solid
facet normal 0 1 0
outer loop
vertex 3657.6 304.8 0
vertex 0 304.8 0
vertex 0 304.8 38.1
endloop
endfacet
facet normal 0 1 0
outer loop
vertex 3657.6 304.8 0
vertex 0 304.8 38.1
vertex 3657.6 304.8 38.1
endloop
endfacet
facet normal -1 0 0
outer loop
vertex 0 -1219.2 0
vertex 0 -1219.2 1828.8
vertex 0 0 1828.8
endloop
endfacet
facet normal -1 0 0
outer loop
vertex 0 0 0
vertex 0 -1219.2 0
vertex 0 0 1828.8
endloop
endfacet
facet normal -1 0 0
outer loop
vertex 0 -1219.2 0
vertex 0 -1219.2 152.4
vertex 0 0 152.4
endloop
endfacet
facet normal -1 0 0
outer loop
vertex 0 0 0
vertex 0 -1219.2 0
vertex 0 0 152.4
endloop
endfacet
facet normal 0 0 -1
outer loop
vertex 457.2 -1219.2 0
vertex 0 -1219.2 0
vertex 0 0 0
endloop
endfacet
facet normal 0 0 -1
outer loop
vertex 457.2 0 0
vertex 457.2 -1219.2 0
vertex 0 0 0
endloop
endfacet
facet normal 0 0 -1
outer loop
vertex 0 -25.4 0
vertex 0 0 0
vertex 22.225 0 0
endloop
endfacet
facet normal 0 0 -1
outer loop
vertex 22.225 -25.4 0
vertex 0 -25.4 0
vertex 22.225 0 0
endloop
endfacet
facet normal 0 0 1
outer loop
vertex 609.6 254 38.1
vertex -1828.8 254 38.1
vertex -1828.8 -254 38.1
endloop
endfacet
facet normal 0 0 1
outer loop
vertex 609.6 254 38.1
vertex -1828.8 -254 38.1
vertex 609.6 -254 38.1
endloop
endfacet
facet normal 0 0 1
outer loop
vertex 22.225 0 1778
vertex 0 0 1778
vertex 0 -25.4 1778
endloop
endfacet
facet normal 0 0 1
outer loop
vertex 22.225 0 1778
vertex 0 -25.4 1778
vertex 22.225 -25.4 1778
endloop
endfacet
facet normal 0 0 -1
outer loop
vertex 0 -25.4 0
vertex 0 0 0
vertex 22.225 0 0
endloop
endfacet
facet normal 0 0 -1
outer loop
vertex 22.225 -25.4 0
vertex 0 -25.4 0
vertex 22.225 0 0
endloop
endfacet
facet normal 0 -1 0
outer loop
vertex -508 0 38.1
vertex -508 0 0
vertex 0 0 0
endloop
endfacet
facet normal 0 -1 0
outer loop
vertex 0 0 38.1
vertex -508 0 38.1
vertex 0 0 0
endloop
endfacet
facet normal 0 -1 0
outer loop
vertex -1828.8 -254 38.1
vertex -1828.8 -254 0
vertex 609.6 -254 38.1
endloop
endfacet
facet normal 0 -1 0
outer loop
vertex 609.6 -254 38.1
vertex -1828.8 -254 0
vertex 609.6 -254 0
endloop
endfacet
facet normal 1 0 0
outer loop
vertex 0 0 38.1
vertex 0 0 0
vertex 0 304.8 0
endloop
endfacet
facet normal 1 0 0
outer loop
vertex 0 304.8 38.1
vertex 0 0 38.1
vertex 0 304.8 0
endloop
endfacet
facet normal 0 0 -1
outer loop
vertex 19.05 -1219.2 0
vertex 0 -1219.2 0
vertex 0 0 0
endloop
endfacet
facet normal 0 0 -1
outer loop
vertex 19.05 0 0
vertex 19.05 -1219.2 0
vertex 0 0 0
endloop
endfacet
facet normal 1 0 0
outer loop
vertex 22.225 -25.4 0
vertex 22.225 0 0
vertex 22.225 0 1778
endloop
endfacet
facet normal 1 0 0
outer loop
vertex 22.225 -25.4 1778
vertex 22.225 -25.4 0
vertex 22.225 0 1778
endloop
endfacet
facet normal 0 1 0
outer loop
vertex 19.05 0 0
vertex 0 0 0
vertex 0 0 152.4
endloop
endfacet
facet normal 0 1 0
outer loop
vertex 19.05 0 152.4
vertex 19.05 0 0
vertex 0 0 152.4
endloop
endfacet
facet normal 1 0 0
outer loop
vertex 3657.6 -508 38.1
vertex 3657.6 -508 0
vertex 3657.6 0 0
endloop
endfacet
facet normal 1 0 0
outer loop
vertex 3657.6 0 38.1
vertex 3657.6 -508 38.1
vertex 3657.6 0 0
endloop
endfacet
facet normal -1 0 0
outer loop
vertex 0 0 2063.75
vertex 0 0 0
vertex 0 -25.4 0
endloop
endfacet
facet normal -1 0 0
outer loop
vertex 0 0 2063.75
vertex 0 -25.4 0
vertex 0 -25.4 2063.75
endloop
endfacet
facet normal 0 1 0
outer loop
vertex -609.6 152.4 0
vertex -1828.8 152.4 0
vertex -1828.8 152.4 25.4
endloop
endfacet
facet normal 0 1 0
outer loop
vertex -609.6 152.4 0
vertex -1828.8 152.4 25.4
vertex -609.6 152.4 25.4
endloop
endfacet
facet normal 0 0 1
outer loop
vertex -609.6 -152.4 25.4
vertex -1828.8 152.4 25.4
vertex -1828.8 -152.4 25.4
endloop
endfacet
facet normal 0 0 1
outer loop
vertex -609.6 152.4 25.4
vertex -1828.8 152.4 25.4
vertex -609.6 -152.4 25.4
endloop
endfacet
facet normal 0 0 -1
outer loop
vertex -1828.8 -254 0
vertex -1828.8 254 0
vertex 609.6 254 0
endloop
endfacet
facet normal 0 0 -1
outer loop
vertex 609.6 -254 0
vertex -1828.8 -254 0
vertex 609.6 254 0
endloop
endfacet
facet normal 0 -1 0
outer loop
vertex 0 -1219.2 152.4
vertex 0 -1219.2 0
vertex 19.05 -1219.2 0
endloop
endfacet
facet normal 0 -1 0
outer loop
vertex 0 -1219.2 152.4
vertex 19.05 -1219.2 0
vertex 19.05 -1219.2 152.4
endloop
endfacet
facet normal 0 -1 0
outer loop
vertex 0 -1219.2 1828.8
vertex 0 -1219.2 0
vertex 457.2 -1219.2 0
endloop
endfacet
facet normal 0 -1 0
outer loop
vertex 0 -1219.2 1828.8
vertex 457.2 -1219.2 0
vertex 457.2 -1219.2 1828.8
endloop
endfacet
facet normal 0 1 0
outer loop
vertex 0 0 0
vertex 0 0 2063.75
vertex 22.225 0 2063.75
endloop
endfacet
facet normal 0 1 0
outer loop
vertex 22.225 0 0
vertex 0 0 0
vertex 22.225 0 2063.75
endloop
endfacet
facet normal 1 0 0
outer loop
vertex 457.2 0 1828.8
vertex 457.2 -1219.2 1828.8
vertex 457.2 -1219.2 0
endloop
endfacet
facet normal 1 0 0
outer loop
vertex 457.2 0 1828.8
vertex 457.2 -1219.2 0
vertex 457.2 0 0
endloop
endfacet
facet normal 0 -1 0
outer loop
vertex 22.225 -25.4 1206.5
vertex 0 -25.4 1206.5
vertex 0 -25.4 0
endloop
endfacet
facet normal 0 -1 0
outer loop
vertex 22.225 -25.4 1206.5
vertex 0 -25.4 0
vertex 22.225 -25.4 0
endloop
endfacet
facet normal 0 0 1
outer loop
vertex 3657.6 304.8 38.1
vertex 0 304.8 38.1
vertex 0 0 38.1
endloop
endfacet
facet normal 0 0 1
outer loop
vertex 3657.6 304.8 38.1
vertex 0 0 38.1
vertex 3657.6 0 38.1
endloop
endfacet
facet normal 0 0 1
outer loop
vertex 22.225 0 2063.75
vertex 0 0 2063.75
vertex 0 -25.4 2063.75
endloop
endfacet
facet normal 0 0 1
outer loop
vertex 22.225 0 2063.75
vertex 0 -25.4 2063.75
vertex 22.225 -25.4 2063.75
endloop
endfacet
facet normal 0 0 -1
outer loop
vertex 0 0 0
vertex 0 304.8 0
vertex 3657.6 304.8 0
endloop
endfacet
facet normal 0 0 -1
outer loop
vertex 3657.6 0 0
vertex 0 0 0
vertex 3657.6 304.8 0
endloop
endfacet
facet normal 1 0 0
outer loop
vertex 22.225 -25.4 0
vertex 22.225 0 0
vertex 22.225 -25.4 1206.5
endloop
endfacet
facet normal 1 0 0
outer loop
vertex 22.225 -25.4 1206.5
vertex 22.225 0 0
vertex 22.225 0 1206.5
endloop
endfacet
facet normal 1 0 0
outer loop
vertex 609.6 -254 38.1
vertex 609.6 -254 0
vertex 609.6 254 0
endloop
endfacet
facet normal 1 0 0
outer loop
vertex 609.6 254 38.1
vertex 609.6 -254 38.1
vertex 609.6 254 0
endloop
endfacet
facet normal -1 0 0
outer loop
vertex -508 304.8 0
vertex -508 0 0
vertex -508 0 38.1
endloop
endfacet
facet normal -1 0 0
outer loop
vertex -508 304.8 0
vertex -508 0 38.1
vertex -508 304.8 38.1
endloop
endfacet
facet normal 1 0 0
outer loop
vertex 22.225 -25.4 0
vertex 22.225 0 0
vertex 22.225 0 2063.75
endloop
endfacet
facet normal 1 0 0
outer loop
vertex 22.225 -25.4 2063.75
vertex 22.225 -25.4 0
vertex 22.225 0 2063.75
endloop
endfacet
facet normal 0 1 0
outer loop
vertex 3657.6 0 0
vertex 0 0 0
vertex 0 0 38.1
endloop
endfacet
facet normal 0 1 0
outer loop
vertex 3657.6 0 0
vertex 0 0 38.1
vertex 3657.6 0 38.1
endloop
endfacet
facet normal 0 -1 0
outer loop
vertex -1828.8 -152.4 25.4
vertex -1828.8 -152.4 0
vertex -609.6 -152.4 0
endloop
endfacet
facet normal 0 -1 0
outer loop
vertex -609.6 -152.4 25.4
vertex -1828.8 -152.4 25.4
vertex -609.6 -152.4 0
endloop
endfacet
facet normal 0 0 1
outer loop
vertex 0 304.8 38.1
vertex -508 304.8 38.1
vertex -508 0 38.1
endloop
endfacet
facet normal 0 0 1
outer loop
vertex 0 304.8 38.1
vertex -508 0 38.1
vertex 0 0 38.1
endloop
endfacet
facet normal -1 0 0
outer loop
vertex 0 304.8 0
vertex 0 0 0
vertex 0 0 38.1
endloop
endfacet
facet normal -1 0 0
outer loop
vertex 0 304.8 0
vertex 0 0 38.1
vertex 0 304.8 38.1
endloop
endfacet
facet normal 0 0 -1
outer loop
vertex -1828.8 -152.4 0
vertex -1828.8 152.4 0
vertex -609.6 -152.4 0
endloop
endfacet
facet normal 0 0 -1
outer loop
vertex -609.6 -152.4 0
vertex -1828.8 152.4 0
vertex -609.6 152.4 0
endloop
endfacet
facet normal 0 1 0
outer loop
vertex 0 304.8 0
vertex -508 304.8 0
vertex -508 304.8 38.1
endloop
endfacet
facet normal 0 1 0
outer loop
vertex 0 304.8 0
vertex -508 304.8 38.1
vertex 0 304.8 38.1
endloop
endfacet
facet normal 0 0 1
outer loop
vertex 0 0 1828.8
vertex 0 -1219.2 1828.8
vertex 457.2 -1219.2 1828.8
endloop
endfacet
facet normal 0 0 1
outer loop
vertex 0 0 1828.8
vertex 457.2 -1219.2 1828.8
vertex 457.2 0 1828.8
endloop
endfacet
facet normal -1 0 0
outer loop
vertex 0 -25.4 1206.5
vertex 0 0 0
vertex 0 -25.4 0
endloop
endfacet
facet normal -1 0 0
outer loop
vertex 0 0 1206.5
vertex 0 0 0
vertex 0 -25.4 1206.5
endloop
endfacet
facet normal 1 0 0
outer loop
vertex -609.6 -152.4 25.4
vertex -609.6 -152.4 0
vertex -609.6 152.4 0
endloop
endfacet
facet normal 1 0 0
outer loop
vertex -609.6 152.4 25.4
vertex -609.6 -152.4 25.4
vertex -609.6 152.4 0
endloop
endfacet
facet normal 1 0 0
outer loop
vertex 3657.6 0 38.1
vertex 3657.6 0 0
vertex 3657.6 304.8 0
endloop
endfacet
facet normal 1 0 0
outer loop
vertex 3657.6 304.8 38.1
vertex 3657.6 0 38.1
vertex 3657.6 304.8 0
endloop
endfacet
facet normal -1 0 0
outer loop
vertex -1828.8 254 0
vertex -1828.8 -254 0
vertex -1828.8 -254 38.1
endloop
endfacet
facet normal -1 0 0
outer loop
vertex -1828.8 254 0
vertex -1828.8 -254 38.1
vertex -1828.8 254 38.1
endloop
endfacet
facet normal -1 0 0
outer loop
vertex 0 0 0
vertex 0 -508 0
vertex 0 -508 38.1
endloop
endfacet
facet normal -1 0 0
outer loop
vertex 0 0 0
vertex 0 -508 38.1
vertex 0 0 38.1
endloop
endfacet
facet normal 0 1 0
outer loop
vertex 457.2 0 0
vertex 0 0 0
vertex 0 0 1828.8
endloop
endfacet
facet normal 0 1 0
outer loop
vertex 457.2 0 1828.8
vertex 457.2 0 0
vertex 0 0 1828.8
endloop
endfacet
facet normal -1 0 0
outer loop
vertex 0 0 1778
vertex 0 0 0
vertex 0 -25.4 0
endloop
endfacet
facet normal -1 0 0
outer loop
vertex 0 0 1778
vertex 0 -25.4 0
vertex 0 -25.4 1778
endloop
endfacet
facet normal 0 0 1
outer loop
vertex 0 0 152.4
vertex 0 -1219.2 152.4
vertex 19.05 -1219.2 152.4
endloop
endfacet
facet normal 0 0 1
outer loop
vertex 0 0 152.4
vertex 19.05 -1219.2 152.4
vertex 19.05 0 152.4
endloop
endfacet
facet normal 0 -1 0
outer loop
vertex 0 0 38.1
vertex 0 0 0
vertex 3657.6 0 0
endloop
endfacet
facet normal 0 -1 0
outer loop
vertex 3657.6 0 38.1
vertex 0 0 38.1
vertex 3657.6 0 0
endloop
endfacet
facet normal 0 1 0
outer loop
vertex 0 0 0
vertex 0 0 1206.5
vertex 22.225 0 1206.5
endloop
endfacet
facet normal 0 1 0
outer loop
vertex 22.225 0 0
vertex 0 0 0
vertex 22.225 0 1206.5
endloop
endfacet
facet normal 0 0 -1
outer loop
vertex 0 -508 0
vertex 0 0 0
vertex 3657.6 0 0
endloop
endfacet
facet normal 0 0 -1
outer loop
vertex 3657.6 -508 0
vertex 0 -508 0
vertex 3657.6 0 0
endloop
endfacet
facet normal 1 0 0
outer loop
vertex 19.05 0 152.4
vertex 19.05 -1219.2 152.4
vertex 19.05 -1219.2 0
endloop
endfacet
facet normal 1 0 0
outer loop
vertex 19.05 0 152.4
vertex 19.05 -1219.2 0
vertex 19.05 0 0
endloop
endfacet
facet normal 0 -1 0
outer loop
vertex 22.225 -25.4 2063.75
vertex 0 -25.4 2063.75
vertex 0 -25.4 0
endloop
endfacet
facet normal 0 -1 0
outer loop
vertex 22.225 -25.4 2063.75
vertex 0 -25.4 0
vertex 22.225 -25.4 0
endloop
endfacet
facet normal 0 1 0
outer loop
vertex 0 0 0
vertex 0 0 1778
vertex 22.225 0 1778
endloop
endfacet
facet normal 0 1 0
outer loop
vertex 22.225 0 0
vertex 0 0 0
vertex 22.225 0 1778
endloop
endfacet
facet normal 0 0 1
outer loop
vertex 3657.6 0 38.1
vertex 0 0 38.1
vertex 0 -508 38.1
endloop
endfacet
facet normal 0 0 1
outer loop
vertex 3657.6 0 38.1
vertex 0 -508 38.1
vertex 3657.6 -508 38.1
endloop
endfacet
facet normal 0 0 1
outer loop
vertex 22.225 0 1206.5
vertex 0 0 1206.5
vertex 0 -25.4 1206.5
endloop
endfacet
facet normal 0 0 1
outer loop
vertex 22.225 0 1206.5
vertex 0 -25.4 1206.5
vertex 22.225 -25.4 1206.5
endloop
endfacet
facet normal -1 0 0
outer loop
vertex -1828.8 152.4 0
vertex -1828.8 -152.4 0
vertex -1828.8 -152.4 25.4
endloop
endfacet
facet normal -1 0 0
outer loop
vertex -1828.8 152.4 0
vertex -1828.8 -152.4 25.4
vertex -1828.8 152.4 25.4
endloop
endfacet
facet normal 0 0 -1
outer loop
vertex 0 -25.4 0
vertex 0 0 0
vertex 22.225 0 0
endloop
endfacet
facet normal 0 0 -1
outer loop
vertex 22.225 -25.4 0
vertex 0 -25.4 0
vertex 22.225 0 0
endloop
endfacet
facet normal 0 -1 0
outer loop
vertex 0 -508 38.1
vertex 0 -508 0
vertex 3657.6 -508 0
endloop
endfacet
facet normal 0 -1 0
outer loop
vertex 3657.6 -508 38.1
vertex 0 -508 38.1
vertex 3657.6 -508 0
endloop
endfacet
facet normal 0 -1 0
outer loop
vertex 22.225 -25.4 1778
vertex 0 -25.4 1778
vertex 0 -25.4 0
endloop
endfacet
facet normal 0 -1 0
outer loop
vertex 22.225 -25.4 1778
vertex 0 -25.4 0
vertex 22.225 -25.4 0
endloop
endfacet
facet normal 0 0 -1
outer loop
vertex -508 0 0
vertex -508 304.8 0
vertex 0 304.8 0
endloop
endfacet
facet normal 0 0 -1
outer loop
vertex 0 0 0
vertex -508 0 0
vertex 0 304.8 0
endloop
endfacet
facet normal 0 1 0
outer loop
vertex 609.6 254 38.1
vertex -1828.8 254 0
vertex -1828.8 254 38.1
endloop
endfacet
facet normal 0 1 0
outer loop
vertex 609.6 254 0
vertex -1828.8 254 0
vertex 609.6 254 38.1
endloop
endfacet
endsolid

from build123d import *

# Parameters (mm, degrees)
F0_W      = 22.225
F0_H      = 1778
F1_DEPTH  = 25.4
F2_W      = 22.225
F2_H      = 1206.5
F3_DEPTH  = 25.4
F4_W      = 22.225
F4_H      = 2063.75
F5_DEPTH  = 25.4
F6_W      = 3657.6
F6_H      = 508
F7_DEPTH  = 38.1
F8_W      = 3657.6
F8_H      = 304.8
F9_DEPTH  = 38.1
F10_W     = 2438.4
F10_H     = 508
F11_DEPTH = 38.1
F12_W     = 1219.2
F12_H     = 304.8
F13_DEPTH = 25.4
F14_W     = 1219.2
F14_H     = 152.4
F15_DEPTH = 19.05
F16_W     = 1219.2
F16_H     = 1828.8
F17_DEPTH = 457.2
F18_W     = 508
F18_H     = 304.8
F19_DEPTH = 38.1


with BuildPart() as f1:
    # F0 (on Front) → F1 (new body)
    with BuildSketch(Plane.XZ):
        with Locations((11.1125, 889)):
            Rectangle(F0_W, F0_H)
    extrude(amount=F1_DEPTH)


with BuildPart() as f3:
    # F2 (on Front) → F3 (new body)
    with BuildSketch(Plane.XZ):
        with Locations((11.1125, 603.25)):
            Rectangle(F2_W, F2_H)
    extrude(amount=F3_DEPTH)


with BuildPart() as f5:
    # F4 (on Front) → F5 (new body)
    with BuildSketch(Plane.XZ):
        with Locations((11.1125, 1031.875)):
            Rectangle(F4_W, F4_H)
    extrude(amount=F5_DEPTH)


with BuildPart() as f7:
    # F6 (on Top) → F7 (new body)
    with BuildSketch(Plane.XY):
        with Locations((1828.8, -254)):
            Rectangle(F6_W, F6_H)
    extrude(amount=F7_DEPTH)


with BuildPart() as f9:
    # F8 (on Top) → F9 (new body)
    with BuildSketch(Plane.XY):
        with Locations((1828.8, 152.4)):
            Rectangle(F8_W, F8_H)
    extrude(amount=F9_DEPTH)


with BuildPart() as f11:
    # F10 (on Top) → F11 (new body)
    with BuildSketch(Plane.XY):
        with Locations((-609.6, 0)):
            Rectangle(F10_W, F10_H)
    extrude(amount=F11_DEPTH)


with BuildPart() as f13:
    # F12 (on Top) → F13 (new body)
    with BuildSketch(Plane.XY):
        with Locations((-1219.2, 0)):
            Rectangle(F12_W, F12_H)
    extrude(amount=F13_DEPTH)


with BuildPart() as f15:
    # F14 (on Right) → F15 (new body)
    with BuildSketch(Plane.YZ):
        with Locations((-609.6, 76.2)):
            Rectangle(F14_W, F14_H)
    extrude(amount=F15_DEPTH)


with BuildPart() as f17:
    # F16 (on Right) → F17 (new body)
    with BuildSketch(Plane.YZ):
        with Locations((-609.6, 914.4)):
            Rectangle(F16_W, F16_H)
    extrude(amount=F17_DEPTH)


with BuildPart() as f19:
    # F18 (on Top) → F19 (new body)
    with BuildSketch(Plane.XY):
        with Locations((-254, 152.4)):
            Rectangle(F18_W, F18_H)
    extrude(amount=F19_DEPTH)


solid = Compound([f1.part, f3.part, f5.part, f7.part, f9.part, f11.part, f13.part, f15.part, f17.part, f19.part])
